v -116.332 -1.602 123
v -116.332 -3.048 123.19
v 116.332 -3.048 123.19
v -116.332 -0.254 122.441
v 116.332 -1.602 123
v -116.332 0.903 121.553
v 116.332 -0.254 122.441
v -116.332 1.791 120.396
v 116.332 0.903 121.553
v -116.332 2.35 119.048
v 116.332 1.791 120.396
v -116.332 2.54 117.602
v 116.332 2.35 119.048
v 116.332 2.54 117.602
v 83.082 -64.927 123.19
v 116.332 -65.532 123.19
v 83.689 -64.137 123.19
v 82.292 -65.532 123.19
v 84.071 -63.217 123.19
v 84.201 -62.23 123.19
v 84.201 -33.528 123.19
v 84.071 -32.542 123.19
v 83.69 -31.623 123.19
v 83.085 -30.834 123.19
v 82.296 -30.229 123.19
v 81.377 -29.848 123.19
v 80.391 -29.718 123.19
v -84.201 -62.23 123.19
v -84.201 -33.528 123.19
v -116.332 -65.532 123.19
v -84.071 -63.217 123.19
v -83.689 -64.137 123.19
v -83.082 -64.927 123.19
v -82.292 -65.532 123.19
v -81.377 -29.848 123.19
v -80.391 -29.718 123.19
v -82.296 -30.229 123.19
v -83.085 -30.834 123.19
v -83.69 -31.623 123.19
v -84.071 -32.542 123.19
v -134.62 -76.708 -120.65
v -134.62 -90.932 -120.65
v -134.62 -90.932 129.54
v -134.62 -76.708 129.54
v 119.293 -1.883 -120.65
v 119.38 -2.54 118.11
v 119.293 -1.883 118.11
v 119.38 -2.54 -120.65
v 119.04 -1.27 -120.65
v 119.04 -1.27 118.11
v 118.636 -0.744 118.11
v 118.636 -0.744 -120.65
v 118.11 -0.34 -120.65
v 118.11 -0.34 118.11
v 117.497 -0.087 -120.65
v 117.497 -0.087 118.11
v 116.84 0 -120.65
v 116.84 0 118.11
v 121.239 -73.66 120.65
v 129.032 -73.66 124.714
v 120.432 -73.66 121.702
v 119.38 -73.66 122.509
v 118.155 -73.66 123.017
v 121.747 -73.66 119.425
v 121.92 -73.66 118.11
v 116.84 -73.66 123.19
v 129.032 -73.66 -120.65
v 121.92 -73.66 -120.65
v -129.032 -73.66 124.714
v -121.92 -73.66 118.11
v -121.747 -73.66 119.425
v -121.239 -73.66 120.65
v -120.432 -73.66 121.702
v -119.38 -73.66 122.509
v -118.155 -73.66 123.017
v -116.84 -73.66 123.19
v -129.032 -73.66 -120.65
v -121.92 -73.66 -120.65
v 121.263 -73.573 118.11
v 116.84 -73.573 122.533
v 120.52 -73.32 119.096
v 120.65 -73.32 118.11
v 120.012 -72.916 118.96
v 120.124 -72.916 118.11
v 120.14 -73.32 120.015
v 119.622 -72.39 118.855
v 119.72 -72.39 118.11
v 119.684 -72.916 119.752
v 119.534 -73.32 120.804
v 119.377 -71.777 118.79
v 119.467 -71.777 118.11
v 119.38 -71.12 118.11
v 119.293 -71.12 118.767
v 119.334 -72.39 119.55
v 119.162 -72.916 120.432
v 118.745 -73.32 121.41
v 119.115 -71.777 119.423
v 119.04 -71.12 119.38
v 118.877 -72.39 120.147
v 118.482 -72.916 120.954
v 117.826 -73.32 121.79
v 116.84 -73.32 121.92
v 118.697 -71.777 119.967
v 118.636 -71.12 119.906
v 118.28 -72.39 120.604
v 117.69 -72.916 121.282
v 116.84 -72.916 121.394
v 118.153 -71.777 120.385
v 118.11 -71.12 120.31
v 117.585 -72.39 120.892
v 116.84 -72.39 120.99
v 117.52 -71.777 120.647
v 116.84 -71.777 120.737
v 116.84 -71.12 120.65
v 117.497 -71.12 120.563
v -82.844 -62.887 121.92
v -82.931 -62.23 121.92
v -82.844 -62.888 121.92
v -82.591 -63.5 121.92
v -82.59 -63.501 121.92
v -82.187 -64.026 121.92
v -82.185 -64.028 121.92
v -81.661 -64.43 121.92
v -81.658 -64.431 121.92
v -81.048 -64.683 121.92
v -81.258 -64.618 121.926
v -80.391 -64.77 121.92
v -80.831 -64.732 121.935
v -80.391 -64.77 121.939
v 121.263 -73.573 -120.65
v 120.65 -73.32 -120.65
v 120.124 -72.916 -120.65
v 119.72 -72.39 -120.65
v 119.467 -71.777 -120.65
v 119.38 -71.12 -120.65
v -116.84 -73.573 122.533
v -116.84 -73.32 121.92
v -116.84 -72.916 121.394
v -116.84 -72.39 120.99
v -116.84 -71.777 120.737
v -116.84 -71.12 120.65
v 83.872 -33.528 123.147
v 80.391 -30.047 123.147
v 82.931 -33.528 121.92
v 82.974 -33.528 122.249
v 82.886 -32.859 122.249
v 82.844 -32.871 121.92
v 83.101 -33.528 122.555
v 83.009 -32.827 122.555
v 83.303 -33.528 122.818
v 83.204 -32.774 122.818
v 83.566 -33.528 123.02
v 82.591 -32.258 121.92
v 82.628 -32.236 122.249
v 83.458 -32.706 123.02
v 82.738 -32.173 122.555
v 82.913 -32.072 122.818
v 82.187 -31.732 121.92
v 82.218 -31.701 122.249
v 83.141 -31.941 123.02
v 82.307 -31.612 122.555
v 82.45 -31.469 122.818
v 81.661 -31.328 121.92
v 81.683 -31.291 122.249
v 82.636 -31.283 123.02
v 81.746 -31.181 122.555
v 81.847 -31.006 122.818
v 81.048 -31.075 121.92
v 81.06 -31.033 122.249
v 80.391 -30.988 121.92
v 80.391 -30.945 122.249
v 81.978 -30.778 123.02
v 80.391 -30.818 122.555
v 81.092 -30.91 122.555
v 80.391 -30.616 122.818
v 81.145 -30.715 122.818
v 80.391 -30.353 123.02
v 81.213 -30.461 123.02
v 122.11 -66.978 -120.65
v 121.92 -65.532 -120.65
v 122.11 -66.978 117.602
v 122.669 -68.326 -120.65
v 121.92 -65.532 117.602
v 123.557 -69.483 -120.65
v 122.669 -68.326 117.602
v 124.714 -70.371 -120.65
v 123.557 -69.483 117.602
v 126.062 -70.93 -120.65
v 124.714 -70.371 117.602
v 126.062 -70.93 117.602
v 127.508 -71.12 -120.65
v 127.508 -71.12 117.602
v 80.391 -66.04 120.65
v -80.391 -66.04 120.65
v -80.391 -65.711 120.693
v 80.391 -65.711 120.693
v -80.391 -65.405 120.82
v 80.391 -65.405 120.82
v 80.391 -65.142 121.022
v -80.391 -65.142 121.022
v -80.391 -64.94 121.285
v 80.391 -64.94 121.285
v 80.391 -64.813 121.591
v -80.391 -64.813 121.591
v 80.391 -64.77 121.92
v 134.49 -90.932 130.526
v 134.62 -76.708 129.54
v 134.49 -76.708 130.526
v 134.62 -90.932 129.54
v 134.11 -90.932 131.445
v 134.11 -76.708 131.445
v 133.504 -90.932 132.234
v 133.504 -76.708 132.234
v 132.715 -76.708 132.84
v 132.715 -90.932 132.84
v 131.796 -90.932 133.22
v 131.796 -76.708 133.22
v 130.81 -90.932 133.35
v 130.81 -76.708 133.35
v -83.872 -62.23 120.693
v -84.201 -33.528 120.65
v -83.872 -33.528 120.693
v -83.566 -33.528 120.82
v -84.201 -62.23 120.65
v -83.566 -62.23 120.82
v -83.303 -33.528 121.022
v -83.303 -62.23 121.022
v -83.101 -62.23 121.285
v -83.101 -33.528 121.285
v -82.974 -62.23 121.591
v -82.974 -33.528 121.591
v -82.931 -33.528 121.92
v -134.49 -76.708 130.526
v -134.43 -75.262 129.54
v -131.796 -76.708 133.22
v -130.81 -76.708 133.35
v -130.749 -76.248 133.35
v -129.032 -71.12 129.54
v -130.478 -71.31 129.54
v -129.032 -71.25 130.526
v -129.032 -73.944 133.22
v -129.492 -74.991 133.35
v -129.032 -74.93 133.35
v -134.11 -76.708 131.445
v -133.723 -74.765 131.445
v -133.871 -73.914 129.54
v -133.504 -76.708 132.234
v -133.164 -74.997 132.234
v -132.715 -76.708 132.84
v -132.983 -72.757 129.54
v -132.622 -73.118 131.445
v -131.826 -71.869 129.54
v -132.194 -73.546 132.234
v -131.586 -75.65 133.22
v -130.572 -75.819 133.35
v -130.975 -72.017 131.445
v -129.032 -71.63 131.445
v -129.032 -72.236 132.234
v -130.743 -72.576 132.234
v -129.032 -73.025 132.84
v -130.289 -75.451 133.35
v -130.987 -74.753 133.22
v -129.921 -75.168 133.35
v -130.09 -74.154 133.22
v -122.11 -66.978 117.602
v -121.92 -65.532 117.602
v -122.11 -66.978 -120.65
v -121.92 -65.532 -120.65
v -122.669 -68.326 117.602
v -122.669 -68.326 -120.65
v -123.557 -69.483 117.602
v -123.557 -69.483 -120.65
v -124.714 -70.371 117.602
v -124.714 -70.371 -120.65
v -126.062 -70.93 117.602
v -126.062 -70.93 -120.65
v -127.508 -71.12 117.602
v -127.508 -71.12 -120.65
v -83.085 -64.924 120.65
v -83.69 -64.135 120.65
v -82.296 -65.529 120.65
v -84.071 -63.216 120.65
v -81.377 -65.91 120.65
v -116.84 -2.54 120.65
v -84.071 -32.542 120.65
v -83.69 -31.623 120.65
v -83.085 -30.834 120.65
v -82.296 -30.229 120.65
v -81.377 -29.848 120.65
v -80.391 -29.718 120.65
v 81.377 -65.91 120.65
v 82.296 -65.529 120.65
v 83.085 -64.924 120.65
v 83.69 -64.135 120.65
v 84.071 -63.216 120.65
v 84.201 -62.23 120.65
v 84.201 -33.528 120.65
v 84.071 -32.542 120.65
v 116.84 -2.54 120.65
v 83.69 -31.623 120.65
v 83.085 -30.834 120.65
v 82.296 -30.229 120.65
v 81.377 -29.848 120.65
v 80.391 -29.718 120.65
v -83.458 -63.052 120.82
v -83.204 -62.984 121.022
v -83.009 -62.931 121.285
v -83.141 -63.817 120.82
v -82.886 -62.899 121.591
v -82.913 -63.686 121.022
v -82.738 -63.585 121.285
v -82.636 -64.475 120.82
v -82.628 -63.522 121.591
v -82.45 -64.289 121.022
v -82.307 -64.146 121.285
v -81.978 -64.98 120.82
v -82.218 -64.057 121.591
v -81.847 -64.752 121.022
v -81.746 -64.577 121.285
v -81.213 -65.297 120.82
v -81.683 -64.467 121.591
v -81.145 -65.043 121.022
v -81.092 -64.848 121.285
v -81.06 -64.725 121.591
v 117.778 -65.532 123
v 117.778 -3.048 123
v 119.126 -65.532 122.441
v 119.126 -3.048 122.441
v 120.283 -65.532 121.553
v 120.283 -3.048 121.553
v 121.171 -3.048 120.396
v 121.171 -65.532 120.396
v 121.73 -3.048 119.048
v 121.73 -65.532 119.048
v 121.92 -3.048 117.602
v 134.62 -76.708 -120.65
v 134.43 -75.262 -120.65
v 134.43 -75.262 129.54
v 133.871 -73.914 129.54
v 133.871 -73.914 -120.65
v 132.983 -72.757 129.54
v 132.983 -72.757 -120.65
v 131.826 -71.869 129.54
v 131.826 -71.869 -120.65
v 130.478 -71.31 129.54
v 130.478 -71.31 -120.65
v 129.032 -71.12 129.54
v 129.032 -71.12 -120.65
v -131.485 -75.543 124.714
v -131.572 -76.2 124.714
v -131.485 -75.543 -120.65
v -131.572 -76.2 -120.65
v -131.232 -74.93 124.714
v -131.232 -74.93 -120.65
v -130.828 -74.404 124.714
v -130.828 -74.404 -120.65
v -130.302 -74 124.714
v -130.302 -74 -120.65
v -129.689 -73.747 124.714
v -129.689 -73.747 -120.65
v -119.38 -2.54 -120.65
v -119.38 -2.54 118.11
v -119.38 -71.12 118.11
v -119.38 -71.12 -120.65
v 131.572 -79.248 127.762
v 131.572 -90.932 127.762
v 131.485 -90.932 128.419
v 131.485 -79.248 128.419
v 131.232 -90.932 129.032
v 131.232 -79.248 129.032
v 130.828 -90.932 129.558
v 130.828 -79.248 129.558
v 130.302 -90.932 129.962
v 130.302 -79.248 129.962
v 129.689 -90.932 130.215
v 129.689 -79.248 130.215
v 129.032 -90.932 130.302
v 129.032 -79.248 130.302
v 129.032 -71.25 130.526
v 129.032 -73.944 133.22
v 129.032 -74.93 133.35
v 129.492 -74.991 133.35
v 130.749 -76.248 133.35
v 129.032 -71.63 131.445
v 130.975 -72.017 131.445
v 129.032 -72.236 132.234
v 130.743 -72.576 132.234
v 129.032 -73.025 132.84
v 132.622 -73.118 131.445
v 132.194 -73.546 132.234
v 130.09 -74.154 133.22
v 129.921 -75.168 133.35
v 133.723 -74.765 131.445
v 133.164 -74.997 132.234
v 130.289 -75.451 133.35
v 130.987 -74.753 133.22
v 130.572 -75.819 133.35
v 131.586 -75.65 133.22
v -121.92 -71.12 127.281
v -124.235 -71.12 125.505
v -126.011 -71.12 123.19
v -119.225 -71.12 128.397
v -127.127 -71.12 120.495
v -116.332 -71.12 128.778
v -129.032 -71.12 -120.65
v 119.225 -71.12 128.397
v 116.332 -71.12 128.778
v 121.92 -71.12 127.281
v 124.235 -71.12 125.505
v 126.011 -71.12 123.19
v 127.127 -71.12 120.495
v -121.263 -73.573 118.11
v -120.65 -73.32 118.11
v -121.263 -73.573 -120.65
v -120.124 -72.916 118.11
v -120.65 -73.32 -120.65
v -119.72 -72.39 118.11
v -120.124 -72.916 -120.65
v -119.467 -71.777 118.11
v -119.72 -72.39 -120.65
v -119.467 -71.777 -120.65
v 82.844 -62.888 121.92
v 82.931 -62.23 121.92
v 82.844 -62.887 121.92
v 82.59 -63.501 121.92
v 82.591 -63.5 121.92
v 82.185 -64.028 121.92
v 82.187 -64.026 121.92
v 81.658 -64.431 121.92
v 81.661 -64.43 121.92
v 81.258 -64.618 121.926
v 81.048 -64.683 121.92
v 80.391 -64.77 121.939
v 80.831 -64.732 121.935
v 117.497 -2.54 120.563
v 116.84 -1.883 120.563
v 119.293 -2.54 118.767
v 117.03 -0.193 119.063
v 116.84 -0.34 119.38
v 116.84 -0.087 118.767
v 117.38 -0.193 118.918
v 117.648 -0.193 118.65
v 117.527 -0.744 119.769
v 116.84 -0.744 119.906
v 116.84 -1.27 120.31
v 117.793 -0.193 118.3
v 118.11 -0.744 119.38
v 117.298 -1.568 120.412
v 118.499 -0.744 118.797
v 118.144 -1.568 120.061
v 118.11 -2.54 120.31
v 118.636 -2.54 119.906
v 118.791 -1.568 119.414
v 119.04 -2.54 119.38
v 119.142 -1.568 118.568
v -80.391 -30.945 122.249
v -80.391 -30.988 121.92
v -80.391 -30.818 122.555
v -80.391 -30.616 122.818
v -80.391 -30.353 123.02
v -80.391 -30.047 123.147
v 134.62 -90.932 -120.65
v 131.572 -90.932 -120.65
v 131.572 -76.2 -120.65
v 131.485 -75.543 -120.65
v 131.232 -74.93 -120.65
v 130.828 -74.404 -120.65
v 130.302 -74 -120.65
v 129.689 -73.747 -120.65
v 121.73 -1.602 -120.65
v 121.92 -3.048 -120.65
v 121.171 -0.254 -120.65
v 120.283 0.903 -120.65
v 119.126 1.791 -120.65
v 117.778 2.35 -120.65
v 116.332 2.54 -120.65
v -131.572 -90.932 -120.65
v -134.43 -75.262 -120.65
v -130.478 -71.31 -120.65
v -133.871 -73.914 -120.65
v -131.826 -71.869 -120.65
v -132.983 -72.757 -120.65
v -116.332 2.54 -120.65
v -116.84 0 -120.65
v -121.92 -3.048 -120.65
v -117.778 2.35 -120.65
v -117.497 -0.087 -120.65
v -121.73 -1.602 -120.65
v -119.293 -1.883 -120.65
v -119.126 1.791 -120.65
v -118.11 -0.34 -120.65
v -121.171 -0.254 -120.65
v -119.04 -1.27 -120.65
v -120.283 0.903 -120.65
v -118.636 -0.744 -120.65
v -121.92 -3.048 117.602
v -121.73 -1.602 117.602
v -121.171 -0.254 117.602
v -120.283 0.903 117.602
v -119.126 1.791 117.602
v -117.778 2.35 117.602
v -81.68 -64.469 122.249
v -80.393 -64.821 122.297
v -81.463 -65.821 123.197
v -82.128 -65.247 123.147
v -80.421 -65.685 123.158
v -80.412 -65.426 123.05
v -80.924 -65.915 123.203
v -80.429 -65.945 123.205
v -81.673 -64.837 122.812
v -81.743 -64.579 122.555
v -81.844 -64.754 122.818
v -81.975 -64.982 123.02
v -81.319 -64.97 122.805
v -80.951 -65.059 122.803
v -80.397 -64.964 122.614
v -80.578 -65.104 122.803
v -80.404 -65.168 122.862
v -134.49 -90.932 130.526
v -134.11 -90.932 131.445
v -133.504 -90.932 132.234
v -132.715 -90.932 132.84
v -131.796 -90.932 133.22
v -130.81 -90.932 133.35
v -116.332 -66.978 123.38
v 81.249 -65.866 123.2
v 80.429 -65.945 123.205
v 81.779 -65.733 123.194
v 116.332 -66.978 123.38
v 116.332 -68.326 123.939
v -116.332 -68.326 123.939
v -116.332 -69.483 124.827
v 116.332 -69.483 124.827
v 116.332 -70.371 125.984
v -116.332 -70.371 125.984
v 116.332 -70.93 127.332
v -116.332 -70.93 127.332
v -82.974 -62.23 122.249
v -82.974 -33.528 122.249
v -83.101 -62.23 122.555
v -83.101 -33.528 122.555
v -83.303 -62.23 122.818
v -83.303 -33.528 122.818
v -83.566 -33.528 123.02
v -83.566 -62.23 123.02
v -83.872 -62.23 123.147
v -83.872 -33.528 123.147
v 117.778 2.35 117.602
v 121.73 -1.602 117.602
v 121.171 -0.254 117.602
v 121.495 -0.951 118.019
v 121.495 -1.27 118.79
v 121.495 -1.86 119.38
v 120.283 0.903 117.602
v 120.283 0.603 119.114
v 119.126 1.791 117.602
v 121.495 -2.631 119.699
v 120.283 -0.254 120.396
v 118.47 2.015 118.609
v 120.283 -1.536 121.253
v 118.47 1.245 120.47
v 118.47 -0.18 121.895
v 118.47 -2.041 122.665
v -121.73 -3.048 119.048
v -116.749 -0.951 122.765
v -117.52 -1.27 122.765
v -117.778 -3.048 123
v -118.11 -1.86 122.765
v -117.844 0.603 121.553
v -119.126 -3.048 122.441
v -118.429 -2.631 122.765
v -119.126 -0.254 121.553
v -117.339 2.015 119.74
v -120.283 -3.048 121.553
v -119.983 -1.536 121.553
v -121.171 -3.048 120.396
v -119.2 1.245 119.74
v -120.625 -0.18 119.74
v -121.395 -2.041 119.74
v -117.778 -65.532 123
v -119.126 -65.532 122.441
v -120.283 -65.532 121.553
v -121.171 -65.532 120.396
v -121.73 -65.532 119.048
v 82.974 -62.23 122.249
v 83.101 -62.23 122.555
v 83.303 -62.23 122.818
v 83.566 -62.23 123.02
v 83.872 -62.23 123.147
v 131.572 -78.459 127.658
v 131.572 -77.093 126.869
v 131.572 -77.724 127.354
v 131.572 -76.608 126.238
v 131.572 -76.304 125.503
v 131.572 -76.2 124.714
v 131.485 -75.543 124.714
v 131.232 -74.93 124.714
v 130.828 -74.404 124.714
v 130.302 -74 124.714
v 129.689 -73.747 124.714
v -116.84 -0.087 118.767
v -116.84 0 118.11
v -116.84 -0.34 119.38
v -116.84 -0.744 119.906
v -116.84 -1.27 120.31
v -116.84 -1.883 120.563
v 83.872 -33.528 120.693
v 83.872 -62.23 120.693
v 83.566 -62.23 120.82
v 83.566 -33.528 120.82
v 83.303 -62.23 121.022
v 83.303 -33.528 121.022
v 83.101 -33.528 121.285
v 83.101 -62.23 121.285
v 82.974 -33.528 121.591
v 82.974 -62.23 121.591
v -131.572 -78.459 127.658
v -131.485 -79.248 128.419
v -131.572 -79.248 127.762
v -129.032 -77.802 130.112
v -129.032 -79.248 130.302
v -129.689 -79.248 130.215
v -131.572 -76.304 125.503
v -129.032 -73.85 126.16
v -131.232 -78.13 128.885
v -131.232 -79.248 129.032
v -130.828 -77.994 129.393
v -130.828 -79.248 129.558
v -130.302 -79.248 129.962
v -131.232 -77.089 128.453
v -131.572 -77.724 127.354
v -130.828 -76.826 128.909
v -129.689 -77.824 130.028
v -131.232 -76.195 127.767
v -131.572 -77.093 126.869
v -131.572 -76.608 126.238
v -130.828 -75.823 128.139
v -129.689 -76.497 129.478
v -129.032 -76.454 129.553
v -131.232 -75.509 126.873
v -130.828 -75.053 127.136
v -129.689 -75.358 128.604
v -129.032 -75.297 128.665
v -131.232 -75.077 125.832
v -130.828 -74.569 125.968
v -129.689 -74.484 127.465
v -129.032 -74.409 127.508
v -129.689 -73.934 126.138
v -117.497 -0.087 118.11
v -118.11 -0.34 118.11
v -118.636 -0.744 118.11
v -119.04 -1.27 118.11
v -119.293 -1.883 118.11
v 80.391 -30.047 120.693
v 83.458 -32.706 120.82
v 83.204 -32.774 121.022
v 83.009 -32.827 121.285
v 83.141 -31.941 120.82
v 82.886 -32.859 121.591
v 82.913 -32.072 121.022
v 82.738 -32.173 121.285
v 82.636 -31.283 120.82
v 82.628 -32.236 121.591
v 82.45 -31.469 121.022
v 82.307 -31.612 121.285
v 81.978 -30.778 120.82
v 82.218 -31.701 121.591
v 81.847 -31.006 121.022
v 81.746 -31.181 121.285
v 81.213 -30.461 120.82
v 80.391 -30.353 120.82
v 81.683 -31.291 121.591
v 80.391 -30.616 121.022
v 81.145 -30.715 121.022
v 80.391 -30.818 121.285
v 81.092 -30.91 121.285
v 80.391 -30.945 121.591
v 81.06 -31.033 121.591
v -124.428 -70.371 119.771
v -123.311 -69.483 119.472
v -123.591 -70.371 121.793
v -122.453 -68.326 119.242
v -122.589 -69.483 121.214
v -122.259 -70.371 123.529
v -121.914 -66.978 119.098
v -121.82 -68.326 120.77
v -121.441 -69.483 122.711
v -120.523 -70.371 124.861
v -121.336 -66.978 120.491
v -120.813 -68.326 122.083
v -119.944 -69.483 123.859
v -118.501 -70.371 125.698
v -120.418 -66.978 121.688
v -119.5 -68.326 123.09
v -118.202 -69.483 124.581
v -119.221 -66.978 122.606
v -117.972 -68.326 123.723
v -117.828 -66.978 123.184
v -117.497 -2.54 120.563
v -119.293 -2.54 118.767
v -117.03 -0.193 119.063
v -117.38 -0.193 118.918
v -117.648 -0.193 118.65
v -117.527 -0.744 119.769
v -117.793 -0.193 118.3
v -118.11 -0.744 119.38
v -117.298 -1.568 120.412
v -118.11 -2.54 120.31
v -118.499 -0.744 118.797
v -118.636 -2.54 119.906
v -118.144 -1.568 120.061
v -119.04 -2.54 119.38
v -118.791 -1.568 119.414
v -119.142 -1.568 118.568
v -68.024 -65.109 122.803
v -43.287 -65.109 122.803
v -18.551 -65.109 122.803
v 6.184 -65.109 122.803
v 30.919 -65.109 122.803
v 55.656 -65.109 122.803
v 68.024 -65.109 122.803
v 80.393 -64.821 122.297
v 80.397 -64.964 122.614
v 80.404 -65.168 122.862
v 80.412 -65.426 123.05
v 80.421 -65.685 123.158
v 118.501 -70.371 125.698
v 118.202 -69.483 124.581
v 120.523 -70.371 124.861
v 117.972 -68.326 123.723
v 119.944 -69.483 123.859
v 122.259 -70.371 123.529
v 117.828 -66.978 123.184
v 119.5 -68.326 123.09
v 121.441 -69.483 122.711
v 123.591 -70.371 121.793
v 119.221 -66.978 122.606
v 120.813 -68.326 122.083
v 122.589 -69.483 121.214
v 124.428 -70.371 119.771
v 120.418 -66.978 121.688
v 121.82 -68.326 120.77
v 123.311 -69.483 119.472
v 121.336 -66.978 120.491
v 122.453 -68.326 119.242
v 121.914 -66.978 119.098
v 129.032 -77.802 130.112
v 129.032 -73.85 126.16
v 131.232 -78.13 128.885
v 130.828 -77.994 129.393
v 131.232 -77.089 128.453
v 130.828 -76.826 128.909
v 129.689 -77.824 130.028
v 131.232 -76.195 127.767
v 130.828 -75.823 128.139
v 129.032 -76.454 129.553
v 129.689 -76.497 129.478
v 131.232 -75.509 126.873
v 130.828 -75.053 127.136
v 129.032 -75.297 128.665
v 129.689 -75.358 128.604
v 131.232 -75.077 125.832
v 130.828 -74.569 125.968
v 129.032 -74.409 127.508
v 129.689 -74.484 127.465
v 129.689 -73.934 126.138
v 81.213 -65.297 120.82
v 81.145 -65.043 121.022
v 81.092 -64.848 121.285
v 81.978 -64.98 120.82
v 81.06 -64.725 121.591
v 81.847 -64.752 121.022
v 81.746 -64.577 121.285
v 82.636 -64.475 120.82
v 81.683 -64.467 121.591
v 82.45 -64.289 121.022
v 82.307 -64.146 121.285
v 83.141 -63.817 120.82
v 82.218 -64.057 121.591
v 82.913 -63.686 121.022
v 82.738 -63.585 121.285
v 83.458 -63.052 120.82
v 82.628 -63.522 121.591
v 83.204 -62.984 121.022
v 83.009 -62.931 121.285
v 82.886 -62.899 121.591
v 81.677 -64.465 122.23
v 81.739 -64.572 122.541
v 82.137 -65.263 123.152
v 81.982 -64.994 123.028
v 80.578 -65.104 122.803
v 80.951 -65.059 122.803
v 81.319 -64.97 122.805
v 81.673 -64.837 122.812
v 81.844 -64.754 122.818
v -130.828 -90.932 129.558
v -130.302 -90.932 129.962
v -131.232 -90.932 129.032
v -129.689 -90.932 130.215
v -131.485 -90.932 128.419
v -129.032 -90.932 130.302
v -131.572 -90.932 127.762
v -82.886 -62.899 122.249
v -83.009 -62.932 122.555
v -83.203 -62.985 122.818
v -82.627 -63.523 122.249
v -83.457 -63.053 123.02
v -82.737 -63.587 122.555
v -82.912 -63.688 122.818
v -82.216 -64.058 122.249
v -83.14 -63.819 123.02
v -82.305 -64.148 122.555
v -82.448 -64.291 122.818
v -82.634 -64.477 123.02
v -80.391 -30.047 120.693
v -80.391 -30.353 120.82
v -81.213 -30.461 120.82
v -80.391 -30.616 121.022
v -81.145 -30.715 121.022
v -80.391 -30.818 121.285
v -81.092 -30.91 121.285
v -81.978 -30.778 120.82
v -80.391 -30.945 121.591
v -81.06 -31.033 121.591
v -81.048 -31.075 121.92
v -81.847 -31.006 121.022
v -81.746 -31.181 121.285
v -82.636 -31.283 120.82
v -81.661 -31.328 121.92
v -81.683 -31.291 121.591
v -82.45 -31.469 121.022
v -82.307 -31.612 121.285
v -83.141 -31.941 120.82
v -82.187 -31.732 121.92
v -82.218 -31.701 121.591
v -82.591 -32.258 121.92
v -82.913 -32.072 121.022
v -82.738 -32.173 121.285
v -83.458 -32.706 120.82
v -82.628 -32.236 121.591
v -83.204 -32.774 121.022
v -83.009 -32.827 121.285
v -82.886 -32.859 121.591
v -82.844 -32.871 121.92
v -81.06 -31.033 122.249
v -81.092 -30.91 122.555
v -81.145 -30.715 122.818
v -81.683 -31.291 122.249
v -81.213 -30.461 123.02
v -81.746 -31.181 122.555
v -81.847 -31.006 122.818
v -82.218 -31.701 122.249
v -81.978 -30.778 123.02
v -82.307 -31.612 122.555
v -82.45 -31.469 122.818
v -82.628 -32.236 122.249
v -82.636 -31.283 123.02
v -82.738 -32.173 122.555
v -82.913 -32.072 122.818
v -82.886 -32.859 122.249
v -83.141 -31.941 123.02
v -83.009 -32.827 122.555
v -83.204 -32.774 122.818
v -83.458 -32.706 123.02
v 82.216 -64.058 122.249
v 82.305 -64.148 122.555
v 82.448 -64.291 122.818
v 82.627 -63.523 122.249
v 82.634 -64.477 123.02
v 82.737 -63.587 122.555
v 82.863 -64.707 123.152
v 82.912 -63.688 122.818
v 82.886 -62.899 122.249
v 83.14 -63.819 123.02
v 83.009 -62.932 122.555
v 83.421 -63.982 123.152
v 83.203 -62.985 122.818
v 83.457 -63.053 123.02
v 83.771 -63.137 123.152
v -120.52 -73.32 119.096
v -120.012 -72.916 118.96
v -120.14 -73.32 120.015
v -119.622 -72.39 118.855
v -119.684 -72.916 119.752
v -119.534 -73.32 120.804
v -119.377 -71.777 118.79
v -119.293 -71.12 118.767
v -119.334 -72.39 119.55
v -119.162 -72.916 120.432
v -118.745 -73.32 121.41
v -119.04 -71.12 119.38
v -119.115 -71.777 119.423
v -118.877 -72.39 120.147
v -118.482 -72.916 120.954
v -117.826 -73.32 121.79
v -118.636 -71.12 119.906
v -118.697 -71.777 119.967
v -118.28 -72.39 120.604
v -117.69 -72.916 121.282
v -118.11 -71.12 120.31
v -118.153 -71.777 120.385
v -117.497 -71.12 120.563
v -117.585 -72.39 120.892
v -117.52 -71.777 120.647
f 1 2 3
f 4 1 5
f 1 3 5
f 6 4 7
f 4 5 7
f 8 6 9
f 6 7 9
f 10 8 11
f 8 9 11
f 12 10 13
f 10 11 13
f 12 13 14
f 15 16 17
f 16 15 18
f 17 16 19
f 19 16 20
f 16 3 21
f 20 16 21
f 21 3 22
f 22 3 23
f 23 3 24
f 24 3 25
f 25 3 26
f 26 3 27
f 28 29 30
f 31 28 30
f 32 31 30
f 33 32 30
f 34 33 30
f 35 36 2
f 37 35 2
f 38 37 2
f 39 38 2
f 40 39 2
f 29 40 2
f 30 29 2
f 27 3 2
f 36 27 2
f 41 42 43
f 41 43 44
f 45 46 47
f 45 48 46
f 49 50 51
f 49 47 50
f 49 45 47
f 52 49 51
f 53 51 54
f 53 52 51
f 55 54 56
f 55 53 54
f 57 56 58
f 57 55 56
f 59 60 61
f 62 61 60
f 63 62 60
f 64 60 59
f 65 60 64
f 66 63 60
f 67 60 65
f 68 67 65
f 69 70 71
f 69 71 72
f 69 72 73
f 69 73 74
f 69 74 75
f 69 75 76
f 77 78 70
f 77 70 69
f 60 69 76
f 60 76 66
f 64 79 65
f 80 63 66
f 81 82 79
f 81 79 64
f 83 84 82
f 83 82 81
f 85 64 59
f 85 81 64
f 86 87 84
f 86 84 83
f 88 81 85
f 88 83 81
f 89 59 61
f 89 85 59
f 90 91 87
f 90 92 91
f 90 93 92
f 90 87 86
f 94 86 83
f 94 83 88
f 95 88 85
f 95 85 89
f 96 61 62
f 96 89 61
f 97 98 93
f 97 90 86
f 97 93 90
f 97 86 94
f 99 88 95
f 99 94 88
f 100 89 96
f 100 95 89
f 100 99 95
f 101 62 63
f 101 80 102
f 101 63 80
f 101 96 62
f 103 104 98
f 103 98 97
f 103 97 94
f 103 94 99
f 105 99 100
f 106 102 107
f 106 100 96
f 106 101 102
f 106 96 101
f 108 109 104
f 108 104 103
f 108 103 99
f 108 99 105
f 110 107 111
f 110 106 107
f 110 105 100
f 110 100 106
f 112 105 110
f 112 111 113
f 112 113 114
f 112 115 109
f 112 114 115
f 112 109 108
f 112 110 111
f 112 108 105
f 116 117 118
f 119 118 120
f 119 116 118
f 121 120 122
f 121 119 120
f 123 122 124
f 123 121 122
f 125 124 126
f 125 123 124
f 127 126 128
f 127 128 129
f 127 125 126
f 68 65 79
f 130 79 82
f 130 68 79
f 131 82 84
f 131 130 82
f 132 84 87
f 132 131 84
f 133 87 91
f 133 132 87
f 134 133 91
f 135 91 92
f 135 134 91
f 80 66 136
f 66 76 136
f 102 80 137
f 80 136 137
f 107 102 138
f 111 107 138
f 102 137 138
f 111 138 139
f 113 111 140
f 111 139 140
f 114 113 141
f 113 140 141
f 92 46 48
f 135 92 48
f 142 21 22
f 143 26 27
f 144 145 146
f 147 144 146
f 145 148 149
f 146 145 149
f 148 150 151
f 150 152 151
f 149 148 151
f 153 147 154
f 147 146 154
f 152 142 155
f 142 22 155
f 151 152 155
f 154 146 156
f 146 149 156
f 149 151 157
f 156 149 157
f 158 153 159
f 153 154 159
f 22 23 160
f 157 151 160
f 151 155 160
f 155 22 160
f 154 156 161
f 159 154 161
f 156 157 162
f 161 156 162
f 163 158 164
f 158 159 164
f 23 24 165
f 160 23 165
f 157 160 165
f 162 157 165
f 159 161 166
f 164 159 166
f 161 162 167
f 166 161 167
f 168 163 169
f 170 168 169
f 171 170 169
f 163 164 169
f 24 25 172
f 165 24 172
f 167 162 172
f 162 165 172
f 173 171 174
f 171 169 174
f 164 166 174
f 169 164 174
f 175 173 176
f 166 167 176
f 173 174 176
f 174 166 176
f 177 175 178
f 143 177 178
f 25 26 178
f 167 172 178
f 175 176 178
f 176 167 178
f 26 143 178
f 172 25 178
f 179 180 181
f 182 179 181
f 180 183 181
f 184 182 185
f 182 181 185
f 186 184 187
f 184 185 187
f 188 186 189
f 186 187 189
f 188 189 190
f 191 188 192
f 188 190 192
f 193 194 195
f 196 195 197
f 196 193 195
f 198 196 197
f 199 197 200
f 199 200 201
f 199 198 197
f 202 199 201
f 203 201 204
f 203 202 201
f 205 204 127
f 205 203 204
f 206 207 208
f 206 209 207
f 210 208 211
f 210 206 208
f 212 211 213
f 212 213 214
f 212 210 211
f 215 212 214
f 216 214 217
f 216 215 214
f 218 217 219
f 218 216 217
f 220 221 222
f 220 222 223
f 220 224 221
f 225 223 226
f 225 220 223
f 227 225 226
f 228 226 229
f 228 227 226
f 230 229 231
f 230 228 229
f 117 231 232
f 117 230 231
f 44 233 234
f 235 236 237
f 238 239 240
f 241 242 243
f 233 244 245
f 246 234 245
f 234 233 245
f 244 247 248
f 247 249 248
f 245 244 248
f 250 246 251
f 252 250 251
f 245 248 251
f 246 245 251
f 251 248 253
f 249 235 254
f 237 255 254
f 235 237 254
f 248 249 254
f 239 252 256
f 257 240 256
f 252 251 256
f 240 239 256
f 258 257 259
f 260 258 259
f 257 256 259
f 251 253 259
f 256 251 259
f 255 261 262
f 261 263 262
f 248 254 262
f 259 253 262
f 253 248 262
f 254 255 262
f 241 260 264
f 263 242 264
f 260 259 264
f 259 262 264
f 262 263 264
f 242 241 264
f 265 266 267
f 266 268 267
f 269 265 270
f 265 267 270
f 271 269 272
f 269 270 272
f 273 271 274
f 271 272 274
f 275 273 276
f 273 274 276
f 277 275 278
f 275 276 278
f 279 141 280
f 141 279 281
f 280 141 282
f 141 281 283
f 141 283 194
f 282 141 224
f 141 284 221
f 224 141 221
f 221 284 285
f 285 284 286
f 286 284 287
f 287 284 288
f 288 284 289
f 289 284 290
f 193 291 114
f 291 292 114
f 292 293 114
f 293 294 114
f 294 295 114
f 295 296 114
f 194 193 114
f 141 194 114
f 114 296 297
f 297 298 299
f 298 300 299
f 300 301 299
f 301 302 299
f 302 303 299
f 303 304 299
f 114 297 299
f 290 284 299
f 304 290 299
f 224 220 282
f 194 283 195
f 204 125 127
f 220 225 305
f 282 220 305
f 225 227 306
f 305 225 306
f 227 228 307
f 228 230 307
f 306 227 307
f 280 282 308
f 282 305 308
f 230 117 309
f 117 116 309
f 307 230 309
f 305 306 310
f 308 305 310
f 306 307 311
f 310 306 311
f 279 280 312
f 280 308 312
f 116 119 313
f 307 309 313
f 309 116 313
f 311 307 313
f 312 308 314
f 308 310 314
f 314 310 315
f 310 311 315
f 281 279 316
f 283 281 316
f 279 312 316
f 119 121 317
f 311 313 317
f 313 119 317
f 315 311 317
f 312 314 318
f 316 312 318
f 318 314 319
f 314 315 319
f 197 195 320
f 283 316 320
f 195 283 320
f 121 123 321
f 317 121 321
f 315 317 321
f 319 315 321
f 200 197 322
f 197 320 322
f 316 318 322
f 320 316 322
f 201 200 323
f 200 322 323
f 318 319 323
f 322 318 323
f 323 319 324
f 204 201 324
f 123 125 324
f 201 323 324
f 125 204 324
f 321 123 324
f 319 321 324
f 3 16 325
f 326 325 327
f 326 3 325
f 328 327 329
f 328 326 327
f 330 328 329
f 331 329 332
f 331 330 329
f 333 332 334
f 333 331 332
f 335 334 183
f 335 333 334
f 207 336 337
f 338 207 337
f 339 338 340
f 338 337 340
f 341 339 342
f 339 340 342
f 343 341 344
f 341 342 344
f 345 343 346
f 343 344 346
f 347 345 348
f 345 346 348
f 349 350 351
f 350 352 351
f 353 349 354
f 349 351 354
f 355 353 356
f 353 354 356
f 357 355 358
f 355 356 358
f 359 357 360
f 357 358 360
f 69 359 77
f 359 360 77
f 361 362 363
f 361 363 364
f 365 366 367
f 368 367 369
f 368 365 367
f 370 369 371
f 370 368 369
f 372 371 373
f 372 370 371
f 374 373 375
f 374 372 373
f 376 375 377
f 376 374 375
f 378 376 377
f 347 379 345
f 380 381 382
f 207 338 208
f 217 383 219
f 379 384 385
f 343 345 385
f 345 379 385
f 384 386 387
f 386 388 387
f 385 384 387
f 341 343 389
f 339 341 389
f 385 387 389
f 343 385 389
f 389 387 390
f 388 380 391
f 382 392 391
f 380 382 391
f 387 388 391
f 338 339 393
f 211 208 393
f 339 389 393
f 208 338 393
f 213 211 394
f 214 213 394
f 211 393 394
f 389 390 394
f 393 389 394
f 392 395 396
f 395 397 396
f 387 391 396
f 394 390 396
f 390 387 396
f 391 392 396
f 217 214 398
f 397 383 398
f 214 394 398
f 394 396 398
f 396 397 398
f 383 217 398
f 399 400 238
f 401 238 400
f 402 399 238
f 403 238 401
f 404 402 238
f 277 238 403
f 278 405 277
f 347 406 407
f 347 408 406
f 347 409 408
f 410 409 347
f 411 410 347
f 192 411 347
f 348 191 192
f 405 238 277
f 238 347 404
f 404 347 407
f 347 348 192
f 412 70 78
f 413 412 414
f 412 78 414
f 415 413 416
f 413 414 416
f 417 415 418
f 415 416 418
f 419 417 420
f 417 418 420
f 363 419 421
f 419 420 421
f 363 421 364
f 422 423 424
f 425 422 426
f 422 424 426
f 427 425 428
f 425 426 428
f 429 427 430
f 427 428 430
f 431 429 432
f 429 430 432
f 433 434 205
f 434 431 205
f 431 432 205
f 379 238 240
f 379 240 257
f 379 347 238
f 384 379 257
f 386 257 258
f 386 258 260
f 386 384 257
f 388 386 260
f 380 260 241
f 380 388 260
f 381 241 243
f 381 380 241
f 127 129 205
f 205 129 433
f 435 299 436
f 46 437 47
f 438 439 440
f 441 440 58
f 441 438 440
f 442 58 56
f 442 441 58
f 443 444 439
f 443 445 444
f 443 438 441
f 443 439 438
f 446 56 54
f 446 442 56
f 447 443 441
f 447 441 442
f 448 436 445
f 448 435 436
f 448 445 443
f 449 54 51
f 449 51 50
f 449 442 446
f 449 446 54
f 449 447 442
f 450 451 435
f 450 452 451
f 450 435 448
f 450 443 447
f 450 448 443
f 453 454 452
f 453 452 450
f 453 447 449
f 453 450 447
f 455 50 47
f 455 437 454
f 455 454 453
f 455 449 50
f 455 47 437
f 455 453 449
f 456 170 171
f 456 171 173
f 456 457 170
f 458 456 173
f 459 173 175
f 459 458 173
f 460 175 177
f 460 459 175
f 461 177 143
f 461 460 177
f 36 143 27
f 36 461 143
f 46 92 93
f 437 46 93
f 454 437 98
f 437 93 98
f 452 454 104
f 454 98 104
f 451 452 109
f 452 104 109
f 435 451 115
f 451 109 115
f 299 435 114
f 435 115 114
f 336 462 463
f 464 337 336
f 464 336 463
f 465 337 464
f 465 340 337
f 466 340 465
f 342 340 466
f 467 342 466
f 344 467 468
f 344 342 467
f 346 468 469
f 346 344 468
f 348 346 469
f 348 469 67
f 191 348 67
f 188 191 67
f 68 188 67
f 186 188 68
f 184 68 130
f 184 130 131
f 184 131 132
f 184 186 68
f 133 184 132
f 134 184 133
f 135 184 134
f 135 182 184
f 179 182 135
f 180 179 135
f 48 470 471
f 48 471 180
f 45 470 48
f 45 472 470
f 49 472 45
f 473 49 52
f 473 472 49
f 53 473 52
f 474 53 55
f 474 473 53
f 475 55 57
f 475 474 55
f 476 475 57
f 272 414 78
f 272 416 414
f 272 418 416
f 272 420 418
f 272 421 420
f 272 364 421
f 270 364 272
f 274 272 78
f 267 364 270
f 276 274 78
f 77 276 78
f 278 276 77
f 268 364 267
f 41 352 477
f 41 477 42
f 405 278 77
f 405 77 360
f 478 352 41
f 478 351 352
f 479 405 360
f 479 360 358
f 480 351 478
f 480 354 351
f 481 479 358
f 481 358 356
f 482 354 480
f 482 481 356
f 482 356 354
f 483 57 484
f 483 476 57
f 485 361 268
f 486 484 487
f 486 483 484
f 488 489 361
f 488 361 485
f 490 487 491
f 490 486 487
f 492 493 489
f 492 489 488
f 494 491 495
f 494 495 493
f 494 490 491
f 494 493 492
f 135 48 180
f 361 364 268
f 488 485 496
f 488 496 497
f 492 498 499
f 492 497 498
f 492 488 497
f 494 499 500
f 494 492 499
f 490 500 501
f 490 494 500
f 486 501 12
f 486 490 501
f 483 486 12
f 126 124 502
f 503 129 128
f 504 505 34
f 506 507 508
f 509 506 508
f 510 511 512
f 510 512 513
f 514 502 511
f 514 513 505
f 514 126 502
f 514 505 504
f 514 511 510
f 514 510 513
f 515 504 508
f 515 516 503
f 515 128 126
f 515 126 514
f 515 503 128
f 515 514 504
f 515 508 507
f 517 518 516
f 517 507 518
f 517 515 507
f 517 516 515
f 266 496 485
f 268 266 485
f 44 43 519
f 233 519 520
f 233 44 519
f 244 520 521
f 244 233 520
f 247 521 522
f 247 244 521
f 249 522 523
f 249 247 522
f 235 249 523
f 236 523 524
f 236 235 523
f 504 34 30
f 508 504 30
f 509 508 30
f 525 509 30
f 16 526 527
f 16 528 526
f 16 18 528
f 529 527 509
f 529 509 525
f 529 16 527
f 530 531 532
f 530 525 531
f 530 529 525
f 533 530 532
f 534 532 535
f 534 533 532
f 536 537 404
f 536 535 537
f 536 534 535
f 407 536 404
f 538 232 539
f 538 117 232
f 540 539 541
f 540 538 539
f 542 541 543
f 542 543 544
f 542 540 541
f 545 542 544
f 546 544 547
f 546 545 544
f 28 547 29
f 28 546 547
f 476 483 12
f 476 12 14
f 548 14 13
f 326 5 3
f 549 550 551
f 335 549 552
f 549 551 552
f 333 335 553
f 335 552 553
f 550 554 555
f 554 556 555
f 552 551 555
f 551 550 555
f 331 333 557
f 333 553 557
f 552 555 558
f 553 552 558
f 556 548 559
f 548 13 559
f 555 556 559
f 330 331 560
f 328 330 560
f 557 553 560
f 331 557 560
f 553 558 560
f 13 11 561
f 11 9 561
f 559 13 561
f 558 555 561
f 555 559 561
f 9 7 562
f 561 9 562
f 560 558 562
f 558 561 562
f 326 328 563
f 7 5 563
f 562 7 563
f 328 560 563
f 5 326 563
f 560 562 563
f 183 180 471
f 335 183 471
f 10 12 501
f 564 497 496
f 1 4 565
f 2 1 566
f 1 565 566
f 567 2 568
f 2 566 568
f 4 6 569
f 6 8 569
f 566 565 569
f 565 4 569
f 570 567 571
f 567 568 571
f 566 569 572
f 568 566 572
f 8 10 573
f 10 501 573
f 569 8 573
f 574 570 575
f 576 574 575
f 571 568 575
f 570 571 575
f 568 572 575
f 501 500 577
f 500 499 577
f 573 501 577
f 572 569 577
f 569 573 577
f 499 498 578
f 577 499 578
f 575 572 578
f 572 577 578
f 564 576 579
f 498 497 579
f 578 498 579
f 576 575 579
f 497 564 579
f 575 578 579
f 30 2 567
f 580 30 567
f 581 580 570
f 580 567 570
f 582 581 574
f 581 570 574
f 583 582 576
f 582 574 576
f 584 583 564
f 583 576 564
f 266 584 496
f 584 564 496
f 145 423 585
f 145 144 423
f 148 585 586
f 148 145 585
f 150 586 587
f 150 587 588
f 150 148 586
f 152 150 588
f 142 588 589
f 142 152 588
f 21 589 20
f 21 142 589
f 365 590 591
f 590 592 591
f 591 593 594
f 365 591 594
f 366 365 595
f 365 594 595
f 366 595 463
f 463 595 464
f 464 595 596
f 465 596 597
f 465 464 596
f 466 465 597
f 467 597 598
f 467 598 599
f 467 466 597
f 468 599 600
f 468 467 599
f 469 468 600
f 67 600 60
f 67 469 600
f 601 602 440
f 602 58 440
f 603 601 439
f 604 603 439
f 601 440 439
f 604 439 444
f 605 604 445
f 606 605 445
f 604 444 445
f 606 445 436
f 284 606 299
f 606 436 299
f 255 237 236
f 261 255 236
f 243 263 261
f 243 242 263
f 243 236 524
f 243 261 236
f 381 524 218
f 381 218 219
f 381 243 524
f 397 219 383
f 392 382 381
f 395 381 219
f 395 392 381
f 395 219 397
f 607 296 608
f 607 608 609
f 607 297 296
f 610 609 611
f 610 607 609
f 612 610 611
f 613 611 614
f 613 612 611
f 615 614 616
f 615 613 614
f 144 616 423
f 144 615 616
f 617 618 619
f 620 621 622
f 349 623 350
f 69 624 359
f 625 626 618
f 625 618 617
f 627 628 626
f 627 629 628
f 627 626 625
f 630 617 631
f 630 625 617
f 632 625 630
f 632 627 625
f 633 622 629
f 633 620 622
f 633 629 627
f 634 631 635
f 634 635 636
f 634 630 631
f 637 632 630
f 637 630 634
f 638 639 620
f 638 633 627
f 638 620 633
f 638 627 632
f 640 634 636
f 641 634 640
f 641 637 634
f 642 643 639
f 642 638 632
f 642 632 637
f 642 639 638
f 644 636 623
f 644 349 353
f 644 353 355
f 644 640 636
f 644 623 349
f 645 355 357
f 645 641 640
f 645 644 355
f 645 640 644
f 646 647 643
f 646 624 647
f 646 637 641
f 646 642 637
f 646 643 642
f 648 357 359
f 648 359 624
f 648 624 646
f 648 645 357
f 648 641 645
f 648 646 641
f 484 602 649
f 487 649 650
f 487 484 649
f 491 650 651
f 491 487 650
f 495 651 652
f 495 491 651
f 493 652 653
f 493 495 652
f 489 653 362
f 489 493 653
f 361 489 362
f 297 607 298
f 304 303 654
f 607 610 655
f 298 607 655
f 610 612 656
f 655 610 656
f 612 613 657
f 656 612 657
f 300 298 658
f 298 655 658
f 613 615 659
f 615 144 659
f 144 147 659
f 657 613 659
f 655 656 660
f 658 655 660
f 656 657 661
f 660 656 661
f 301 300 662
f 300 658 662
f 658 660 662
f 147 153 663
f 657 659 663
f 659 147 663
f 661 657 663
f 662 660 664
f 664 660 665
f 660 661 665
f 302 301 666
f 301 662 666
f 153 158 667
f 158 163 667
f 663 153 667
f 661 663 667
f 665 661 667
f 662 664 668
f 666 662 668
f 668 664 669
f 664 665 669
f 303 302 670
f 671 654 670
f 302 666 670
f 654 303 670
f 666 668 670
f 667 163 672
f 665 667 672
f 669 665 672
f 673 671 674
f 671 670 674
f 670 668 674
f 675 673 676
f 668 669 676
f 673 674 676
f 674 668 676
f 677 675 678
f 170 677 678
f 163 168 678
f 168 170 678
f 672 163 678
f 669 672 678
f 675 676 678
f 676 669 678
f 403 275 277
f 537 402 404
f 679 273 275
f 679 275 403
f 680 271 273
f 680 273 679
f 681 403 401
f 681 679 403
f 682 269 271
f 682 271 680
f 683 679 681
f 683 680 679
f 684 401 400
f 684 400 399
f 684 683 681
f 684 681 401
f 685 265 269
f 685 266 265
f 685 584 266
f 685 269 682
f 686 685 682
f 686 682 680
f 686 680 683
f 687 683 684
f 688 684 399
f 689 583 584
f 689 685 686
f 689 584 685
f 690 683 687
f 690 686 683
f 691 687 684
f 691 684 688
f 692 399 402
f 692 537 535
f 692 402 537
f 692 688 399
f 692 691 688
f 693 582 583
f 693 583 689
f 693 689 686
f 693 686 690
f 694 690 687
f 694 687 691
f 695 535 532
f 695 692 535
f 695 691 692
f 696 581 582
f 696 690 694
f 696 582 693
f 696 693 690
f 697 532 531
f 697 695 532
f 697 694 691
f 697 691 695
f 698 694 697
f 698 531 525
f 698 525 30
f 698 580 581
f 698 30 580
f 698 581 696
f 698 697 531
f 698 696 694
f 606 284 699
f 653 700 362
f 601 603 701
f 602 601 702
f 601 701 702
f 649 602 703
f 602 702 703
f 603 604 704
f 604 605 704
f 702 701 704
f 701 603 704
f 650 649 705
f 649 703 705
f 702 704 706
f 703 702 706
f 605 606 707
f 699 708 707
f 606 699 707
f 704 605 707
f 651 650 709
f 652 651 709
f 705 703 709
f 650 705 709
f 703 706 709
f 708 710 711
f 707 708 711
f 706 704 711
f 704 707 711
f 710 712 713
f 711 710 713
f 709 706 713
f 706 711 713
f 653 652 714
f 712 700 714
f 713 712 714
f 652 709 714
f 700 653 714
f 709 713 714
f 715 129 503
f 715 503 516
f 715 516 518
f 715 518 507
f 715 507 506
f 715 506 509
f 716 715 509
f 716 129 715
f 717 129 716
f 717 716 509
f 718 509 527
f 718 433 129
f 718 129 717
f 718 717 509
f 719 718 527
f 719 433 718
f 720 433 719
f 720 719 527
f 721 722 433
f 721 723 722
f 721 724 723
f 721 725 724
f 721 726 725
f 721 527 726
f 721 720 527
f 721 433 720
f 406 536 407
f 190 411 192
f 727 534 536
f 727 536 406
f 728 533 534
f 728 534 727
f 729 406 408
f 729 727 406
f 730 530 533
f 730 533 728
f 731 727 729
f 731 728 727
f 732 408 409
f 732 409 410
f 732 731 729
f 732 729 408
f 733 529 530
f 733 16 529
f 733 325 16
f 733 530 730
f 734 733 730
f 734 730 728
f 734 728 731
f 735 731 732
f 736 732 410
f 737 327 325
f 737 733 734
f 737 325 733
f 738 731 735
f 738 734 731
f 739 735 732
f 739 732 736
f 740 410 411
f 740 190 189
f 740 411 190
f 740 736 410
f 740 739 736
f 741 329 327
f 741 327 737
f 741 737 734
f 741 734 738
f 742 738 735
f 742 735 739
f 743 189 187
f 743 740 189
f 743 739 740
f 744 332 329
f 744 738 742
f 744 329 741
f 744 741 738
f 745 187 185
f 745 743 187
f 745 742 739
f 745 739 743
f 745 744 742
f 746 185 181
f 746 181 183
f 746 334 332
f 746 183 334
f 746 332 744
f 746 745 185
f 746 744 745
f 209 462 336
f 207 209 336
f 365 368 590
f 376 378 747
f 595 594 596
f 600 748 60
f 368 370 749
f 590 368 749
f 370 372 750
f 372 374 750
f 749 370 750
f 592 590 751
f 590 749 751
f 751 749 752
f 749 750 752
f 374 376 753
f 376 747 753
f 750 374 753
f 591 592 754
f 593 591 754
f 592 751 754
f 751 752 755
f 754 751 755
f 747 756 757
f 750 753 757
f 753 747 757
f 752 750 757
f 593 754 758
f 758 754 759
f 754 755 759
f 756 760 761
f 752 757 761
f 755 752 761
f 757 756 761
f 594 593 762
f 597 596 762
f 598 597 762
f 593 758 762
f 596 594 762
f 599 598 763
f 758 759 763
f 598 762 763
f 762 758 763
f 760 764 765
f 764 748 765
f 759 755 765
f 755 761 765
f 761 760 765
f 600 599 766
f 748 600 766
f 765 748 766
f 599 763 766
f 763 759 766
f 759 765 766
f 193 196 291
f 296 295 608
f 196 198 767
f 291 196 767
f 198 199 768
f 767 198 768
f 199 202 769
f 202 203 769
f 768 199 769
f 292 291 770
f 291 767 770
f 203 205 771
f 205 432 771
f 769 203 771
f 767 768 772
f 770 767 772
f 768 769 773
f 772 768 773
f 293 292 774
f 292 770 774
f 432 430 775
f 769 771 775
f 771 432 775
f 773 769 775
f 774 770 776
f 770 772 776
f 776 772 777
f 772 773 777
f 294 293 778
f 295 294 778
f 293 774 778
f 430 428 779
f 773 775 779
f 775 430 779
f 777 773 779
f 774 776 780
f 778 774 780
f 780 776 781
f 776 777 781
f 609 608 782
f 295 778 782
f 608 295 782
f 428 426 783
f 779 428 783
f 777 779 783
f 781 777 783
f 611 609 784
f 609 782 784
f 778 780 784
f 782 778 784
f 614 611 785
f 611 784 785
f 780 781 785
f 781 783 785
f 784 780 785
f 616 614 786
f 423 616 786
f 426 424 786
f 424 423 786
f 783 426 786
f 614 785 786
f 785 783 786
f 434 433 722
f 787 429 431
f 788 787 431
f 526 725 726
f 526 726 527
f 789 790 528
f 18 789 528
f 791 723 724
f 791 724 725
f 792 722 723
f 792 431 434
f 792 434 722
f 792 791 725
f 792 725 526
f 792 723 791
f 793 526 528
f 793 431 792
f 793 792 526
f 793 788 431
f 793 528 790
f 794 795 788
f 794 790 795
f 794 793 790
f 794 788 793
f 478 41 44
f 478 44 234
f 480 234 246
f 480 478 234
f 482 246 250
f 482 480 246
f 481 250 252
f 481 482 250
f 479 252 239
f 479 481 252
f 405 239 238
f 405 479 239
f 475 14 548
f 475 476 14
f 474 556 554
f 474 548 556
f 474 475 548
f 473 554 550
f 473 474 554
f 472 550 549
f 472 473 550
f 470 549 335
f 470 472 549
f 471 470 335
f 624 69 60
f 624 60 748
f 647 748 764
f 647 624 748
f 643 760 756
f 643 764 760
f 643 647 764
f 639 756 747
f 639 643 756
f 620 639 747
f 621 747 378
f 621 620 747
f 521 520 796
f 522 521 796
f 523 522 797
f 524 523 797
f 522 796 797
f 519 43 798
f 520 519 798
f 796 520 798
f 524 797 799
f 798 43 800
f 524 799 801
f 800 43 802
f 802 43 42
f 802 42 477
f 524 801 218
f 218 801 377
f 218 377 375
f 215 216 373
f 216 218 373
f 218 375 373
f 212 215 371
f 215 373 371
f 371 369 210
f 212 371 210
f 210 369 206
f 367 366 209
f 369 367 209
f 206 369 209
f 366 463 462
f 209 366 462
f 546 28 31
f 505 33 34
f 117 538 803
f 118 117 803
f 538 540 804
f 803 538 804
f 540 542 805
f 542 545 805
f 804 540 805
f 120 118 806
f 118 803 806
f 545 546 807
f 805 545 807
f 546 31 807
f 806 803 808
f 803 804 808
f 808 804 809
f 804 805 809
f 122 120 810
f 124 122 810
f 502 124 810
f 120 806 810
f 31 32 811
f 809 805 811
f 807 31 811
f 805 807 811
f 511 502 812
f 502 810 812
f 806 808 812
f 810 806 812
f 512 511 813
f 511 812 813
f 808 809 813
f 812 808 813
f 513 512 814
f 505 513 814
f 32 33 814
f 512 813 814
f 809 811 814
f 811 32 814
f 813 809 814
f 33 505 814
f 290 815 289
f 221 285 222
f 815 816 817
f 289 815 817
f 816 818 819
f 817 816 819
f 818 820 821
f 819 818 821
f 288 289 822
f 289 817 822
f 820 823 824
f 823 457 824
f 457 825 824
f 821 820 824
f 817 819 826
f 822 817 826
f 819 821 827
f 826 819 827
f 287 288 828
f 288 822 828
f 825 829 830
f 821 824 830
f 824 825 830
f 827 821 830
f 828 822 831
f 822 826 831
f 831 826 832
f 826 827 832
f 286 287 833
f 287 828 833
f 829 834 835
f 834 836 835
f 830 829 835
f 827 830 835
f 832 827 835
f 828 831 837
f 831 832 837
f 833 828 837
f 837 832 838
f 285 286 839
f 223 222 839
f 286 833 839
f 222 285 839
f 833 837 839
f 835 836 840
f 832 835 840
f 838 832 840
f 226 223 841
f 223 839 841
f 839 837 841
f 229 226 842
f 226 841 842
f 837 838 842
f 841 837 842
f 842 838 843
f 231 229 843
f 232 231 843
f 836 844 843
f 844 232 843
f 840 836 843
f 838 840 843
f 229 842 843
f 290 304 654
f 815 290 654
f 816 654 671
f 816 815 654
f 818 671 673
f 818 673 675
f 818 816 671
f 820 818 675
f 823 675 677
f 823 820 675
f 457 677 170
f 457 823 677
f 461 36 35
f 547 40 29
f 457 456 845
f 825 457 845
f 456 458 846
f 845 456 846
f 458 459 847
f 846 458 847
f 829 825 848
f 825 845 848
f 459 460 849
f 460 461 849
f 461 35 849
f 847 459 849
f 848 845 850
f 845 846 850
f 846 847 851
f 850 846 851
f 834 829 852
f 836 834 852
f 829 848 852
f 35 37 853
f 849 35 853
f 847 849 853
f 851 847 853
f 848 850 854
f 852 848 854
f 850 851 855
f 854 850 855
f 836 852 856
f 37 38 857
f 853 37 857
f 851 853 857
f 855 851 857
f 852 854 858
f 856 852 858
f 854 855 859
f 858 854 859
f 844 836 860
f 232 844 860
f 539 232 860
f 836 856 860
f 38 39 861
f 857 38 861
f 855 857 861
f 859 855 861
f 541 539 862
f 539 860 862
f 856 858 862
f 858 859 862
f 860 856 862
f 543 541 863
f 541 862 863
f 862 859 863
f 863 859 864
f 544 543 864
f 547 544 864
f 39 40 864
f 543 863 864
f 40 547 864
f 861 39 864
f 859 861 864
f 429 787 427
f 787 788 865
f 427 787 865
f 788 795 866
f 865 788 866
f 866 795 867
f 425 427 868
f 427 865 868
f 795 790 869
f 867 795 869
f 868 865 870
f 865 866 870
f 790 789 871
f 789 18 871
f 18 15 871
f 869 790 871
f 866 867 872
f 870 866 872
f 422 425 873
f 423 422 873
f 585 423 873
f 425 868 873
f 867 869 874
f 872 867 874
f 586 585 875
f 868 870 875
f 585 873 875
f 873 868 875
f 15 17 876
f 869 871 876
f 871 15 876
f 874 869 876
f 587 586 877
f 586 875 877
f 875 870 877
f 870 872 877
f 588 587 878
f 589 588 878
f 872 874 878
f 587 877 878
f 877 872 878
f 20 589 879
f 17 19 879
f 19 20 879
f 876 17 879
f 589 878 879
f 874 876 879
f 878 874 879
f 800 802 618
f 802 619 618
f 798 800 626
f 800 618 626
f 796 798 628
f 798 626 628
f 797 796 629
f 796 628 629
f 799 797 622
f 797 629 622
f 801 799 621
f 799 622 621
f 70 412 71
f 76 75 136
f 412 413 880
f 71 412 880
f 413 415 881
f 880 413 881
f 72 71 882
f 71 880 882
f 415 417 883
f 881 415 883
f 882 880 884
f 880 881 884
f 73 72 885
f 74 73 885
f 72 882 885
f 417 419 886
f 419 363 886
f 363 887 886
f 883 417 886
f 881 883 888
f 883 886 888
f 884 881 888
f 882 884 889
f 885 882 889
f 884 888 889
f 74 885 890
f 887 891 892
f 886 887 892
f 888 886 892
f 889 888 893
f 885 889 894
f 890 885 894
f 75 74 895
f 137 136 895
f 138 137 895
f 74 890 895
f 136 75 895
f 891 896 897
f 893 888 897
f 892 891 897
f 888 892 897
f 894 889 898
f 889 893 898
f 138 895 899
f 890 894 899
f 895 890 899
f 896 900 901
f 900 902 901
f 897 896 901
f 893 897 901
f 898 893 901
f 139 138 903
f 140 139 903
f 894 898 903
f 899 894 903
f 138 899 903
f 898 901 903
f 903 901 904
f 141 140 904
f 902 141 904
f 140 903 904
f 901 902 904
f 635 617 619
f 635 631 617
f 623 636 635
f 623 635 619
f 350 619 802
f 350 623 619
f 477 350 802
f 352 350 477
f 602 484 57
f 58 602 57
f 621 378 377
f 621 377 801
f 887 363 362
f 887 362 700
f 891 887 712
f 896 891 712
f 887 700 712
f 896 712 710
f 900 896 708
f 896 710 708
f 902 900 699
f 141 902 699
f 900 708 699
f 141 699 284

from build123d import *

# Parameters (mm, degrees)
SKETCH1_W            = 243.84
SKETCH1_H            = 241.3
BOSS_EXTRUDE1_DEPTH  = 2.54
SKETCH2_W            = 241.3
SKETCH2_H            = 76.2
BOSS_EXTRUDE2_DEPTH  = 2.54
SKETCH3_W            = 243.84
SKETCH3_H            = 76.2
BOSS_EXTRUDE3_DEPTH  = 2.54
SKETCH6_W            = 165.862
SKETCH6_H            = 33.782
CUT_EXTRUDE3_DEPTH   = 2.54
SKETCH22_W           = 12.7
SKETCH22_H           = 243.84
BOSS_EXTRUDE8_DEPTH  = 2.54
SKETCH24_W           = 3.048
SKETCH24_H           = 243.84
BOSS_EXTRUDE10_DEPTH = 19.812
SKETCH27_W           = 269.24
SKETCH27_H           = 19.812
BOSS_EXTRUDE11_DEPTH = 12.7
SKETCH28_W           = 263.144
SKETCH28_H           = 17.272
CUT_EXTRUDE6_DEPTH   = 9.652
FILLET4_R            = 5.588
FILLET5_R            = 2.54
FILLET6_R            = 3.81
FILLET7_R            = 2.54
FILLET8_R            = 1.27


with BuildPart() as part:
    # Sketch1 → Boss-Extrude1 (new body)
    with BuildSketch(Plane(origin=(0, 0, 0), x_dir=(1, 0, 0), z_dir=(0, 1, 0))):
        Rectangle(SKETCH1_W, SKETCH1_H)
    extrude(amount=BOSS_EXTRUDE1_DEPTH)

    # Sketch2 → Boss-Extrude2 (add)
    with BuildSketch(Plane(origin=(121.92, 0, 0), x_dir=(0, 0, -1), z_dir=(1, 0, 0))):
        with Locations((0, -35.56)):
            Rectangle(SKETCH2_W, SKETCH2_H)
    boss_extrude2 = extrude(amount=-BOSS_EXTRUDE2_DEPTH)

    # Sketch3 → Boss-Extrude3 (add)
    with BuildSketch(Plane.XY.offset(120.65)):
        with Locations((0, -35.56)):
            Rectangle(SKETCH3_W, SKETCH3_H)
    extrude(amount=BOSS_EXTRUDE3_DEPTH)

    # Sketch6 → Cut-Extrude3 (cut)
    with BuildSketch(Plane.XY.offset(123.19)):
        with Locations((0, -47.879)):
            Rectangle(SKETCH6_W, SKETCH6_H)
    extrude(amount=-CUT_EXTRUDE3_DEPTH, mode=Mode.SUBTRACT)

    # Mirror15: Boss-Extrude2 across plane
    add(boss_extrude2.mirror(Plane.ZY))


with BuildPart() as body_2:
    # Sketch22 → Boss-Extrude8 (new body)
    with BuildSketch(Plane(origin=(0, -71.12, 0), x_dir=(-1, 0, 0), z_dir=(0, -1, 0))):
        with Locations((-128.27, -1.27)):
            Rectangle(SKETCH22_W, SKETCH22_H)
    boss_extrude8 = extrude(amount=BOSS_EXTRUDE8_DEPTH)

    # Sketch24 → Boss-Extrude10 (add)
    with BuildSketch(Plane(origin=(0, -71.12, 0), x_dir=(1, 0, 0), z_dir=(0, 1, 0))):
        with Locations((133.096, -1.27)):
            Rectangle(SKETCH24_W, SKETCH24_H)
    boss_extrude10 = extrude(amount=-BOSS_EXTRUDE10_DEPTH)


with BuildPart() as part_1:
    add(part.part)

    # Mirror18: Boss-Extrude8, Boss-Extrude10 across plane
    add(boss_extrude8.mirror(Plane.ZY))
    add(boss_extrude10.mirror(Plane.ZY))

    add(body_2.part)  # Boss-Extrude11 merges body 2
    # Sketch27 → Boss-Extrude11 (add)
    with BuildSketch(Plane.XY.offset(120.65)):
        with Locations((0, -81.026)):
            Rectangle(SKETCH27_W, SKETCH27_H)
    extrude(amount=BOSS_EXTRUDE11_DEPTH)

    # Sketch28 → Cut-Extrude6 (cut)
    with BuildSketch(Plane(origin=(0, 0, 120.65), x_dir=(-1, 0, 0), z_dir=(0, 0, -1))):
        with Locations((0, -82.296)):
            Rectangle(SKETCH28_W, SKETCH28_H)
    extrude(amount=-CUT_EXTRUDE6_DEPTH, mode=Mode.SUBTRACT)

    # Fillet4
    fillet4_edges = [part_1.edges().sort_by_distance(p)[0] for p in [
        (-121.92, -71.12, 1.27),
        (-121.92, 2.54, 1.27),
        (0, -71.12, 123.19),
        (0, 2.54, 123.19),
        (-134.62, -71.12, 6.35),
        (134.62, -71.12, 6.35),
        (0, -73.66, 130.302),
        (121.92, -71.12, 1.27),
        (121.92, 2.54, 1.27),
        (121.92, -34.29, 123.19),
        (-121.92, -34.29, 123.19),
    ]]
    fillet(fillet4_edges, radius=FILLET4_R)

    # Fillet5
    fillet5_edges = [part_1.edges().sort_by_distance(p)[0] for p in [
        (-131.572, -85.09, 130.302),
        (0, -73.66, 120.65),
        (131.572, -85.09, 130.302),
        (131.572, -73.66, 2.032),
        (131.572, -75.296687307, 128.665312693),
        (-131.572, -73.66, 2.032),
        (-131.572, -75.296687307, 128.665312693),
        (119.38, -36.83, 120.65),
        (-119.38, -36.83, 120.65),
        (0, 0, 120.65),
        (119.38, -73.66, 0),
        (119.38, 0, 0),
        (-119.38, 0, 0),
        (-119.38, -73.66, 0),
    ]]
    fillet(fillet5_edges, radius=FILLET5_R)

    # Fillet6
    fillet6_edges = [part_1.edges().sort_by_distance(p)[0] for p in [
        (0, -71.12, 133.35),
        (-134.62, -83.82, 133.35),
        (132.983312693, -72.756687307, 133.35),
        (-132.983312693, -72.756687307, 133.35),
        (134.62, -83.82, 133.35),
    ]]
    fillet(fillet6_edges, radius=FILLET6_R)

    # Fillet7
    fillet7_edges = [part_1.edges().sort_by_distance(p)[0] for p in [
        (82.931, -64.77, 121.92),
        (-82.931, -64.77, 121.92),
        (-82.931, -30.988, 121.92),
        (82.931, -30.988, 121.92),
    ]]
    fillet(fillet7_edges, radius=FILLET7_R)

    # Fillet8
    fillet8_edges = [part_1.edges().sort_by_distance(p)[0] for p in [
        (-82.187051224, -31.731948776, 120.65),
        (0, -30.988, 120.65),
        (82.187051224, -31.731948776, 120.65),
        (82.931, -47.879, 120.65),
        (82.187051224, -64.026051224, 120.65),
        (0, -64.77, 120.65),
        (-82.187051224, -64.026051224, 120.65),
        (-82.187051224, -31.731948776, 123.19),
        (0, -30.988, 123.19),
        (82.187051224, -31.731948776, 123.19),
        (82.931, -47.879, 123.19),
        (82.187051224, -64.026051224, 123.19),
        (0, -64.77, 123.19),
        (-82.187051224, -64.026051224, 123.19),
        (-82.931, -47.879, 120.65),
        (-82.931, -47.879, 123.19),
    ]]
    fillet(fillet8_edges, radius=FILLET8_R - 0.0001)  # a hair under: the kernel refuses the full size


solid = part_1.part
